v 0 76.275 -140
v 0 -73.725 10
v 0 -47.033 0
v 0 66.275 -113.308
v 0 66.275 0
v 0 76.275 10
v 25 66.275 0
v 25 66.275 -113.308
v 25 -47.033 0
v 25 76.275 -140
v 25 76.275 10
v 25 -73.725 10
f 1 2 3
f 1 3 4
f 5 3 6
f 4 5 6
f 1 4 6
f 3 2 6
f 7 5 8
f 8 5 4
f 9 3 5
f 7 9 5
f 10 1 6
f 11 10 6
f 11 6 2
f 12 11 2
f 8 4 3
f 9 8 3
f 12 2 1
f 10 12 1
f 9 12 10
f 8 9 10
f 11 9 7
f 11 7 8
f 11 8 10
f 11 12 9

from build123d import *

# Parameters (mm, degrees)
F1_DEPTH = 25


with BuildPart() as f1:
    # F0 (on Right) → F1 (new body)
    with BuildSketch(Plane.YZ):
        Polygon((-57.0327825844, 10), (-73.7252708524, 10), (-63.7252708524, 0), (-47.0327825844, 0), align=None)
        Polygon((76.2747291476, 10), (-57.0327825844, 10), (-47.0327825844, 0), (66.2747291476, 0), (76.2747291476, 0), align=None)
        Polygon((76.2747291476, -123.307511732), (76.2747291476, 0), (66.2747291476, 0), (66.2747291476, -113.307511732), align=None)
        Polygon((66.2747291476, -113.307511732), (66.2747291476, -130), (76.2747291476, -140), (76.2747291476, -123.307511732), align=None)
        Polygon((-47.0327825844, 0), (-63.7252708524, 0), (66.2747291476, -130), (66.2747291476, -113.307511732), align=None)
    extrude(amount=F1_DEPTH)


solid = f1.part
